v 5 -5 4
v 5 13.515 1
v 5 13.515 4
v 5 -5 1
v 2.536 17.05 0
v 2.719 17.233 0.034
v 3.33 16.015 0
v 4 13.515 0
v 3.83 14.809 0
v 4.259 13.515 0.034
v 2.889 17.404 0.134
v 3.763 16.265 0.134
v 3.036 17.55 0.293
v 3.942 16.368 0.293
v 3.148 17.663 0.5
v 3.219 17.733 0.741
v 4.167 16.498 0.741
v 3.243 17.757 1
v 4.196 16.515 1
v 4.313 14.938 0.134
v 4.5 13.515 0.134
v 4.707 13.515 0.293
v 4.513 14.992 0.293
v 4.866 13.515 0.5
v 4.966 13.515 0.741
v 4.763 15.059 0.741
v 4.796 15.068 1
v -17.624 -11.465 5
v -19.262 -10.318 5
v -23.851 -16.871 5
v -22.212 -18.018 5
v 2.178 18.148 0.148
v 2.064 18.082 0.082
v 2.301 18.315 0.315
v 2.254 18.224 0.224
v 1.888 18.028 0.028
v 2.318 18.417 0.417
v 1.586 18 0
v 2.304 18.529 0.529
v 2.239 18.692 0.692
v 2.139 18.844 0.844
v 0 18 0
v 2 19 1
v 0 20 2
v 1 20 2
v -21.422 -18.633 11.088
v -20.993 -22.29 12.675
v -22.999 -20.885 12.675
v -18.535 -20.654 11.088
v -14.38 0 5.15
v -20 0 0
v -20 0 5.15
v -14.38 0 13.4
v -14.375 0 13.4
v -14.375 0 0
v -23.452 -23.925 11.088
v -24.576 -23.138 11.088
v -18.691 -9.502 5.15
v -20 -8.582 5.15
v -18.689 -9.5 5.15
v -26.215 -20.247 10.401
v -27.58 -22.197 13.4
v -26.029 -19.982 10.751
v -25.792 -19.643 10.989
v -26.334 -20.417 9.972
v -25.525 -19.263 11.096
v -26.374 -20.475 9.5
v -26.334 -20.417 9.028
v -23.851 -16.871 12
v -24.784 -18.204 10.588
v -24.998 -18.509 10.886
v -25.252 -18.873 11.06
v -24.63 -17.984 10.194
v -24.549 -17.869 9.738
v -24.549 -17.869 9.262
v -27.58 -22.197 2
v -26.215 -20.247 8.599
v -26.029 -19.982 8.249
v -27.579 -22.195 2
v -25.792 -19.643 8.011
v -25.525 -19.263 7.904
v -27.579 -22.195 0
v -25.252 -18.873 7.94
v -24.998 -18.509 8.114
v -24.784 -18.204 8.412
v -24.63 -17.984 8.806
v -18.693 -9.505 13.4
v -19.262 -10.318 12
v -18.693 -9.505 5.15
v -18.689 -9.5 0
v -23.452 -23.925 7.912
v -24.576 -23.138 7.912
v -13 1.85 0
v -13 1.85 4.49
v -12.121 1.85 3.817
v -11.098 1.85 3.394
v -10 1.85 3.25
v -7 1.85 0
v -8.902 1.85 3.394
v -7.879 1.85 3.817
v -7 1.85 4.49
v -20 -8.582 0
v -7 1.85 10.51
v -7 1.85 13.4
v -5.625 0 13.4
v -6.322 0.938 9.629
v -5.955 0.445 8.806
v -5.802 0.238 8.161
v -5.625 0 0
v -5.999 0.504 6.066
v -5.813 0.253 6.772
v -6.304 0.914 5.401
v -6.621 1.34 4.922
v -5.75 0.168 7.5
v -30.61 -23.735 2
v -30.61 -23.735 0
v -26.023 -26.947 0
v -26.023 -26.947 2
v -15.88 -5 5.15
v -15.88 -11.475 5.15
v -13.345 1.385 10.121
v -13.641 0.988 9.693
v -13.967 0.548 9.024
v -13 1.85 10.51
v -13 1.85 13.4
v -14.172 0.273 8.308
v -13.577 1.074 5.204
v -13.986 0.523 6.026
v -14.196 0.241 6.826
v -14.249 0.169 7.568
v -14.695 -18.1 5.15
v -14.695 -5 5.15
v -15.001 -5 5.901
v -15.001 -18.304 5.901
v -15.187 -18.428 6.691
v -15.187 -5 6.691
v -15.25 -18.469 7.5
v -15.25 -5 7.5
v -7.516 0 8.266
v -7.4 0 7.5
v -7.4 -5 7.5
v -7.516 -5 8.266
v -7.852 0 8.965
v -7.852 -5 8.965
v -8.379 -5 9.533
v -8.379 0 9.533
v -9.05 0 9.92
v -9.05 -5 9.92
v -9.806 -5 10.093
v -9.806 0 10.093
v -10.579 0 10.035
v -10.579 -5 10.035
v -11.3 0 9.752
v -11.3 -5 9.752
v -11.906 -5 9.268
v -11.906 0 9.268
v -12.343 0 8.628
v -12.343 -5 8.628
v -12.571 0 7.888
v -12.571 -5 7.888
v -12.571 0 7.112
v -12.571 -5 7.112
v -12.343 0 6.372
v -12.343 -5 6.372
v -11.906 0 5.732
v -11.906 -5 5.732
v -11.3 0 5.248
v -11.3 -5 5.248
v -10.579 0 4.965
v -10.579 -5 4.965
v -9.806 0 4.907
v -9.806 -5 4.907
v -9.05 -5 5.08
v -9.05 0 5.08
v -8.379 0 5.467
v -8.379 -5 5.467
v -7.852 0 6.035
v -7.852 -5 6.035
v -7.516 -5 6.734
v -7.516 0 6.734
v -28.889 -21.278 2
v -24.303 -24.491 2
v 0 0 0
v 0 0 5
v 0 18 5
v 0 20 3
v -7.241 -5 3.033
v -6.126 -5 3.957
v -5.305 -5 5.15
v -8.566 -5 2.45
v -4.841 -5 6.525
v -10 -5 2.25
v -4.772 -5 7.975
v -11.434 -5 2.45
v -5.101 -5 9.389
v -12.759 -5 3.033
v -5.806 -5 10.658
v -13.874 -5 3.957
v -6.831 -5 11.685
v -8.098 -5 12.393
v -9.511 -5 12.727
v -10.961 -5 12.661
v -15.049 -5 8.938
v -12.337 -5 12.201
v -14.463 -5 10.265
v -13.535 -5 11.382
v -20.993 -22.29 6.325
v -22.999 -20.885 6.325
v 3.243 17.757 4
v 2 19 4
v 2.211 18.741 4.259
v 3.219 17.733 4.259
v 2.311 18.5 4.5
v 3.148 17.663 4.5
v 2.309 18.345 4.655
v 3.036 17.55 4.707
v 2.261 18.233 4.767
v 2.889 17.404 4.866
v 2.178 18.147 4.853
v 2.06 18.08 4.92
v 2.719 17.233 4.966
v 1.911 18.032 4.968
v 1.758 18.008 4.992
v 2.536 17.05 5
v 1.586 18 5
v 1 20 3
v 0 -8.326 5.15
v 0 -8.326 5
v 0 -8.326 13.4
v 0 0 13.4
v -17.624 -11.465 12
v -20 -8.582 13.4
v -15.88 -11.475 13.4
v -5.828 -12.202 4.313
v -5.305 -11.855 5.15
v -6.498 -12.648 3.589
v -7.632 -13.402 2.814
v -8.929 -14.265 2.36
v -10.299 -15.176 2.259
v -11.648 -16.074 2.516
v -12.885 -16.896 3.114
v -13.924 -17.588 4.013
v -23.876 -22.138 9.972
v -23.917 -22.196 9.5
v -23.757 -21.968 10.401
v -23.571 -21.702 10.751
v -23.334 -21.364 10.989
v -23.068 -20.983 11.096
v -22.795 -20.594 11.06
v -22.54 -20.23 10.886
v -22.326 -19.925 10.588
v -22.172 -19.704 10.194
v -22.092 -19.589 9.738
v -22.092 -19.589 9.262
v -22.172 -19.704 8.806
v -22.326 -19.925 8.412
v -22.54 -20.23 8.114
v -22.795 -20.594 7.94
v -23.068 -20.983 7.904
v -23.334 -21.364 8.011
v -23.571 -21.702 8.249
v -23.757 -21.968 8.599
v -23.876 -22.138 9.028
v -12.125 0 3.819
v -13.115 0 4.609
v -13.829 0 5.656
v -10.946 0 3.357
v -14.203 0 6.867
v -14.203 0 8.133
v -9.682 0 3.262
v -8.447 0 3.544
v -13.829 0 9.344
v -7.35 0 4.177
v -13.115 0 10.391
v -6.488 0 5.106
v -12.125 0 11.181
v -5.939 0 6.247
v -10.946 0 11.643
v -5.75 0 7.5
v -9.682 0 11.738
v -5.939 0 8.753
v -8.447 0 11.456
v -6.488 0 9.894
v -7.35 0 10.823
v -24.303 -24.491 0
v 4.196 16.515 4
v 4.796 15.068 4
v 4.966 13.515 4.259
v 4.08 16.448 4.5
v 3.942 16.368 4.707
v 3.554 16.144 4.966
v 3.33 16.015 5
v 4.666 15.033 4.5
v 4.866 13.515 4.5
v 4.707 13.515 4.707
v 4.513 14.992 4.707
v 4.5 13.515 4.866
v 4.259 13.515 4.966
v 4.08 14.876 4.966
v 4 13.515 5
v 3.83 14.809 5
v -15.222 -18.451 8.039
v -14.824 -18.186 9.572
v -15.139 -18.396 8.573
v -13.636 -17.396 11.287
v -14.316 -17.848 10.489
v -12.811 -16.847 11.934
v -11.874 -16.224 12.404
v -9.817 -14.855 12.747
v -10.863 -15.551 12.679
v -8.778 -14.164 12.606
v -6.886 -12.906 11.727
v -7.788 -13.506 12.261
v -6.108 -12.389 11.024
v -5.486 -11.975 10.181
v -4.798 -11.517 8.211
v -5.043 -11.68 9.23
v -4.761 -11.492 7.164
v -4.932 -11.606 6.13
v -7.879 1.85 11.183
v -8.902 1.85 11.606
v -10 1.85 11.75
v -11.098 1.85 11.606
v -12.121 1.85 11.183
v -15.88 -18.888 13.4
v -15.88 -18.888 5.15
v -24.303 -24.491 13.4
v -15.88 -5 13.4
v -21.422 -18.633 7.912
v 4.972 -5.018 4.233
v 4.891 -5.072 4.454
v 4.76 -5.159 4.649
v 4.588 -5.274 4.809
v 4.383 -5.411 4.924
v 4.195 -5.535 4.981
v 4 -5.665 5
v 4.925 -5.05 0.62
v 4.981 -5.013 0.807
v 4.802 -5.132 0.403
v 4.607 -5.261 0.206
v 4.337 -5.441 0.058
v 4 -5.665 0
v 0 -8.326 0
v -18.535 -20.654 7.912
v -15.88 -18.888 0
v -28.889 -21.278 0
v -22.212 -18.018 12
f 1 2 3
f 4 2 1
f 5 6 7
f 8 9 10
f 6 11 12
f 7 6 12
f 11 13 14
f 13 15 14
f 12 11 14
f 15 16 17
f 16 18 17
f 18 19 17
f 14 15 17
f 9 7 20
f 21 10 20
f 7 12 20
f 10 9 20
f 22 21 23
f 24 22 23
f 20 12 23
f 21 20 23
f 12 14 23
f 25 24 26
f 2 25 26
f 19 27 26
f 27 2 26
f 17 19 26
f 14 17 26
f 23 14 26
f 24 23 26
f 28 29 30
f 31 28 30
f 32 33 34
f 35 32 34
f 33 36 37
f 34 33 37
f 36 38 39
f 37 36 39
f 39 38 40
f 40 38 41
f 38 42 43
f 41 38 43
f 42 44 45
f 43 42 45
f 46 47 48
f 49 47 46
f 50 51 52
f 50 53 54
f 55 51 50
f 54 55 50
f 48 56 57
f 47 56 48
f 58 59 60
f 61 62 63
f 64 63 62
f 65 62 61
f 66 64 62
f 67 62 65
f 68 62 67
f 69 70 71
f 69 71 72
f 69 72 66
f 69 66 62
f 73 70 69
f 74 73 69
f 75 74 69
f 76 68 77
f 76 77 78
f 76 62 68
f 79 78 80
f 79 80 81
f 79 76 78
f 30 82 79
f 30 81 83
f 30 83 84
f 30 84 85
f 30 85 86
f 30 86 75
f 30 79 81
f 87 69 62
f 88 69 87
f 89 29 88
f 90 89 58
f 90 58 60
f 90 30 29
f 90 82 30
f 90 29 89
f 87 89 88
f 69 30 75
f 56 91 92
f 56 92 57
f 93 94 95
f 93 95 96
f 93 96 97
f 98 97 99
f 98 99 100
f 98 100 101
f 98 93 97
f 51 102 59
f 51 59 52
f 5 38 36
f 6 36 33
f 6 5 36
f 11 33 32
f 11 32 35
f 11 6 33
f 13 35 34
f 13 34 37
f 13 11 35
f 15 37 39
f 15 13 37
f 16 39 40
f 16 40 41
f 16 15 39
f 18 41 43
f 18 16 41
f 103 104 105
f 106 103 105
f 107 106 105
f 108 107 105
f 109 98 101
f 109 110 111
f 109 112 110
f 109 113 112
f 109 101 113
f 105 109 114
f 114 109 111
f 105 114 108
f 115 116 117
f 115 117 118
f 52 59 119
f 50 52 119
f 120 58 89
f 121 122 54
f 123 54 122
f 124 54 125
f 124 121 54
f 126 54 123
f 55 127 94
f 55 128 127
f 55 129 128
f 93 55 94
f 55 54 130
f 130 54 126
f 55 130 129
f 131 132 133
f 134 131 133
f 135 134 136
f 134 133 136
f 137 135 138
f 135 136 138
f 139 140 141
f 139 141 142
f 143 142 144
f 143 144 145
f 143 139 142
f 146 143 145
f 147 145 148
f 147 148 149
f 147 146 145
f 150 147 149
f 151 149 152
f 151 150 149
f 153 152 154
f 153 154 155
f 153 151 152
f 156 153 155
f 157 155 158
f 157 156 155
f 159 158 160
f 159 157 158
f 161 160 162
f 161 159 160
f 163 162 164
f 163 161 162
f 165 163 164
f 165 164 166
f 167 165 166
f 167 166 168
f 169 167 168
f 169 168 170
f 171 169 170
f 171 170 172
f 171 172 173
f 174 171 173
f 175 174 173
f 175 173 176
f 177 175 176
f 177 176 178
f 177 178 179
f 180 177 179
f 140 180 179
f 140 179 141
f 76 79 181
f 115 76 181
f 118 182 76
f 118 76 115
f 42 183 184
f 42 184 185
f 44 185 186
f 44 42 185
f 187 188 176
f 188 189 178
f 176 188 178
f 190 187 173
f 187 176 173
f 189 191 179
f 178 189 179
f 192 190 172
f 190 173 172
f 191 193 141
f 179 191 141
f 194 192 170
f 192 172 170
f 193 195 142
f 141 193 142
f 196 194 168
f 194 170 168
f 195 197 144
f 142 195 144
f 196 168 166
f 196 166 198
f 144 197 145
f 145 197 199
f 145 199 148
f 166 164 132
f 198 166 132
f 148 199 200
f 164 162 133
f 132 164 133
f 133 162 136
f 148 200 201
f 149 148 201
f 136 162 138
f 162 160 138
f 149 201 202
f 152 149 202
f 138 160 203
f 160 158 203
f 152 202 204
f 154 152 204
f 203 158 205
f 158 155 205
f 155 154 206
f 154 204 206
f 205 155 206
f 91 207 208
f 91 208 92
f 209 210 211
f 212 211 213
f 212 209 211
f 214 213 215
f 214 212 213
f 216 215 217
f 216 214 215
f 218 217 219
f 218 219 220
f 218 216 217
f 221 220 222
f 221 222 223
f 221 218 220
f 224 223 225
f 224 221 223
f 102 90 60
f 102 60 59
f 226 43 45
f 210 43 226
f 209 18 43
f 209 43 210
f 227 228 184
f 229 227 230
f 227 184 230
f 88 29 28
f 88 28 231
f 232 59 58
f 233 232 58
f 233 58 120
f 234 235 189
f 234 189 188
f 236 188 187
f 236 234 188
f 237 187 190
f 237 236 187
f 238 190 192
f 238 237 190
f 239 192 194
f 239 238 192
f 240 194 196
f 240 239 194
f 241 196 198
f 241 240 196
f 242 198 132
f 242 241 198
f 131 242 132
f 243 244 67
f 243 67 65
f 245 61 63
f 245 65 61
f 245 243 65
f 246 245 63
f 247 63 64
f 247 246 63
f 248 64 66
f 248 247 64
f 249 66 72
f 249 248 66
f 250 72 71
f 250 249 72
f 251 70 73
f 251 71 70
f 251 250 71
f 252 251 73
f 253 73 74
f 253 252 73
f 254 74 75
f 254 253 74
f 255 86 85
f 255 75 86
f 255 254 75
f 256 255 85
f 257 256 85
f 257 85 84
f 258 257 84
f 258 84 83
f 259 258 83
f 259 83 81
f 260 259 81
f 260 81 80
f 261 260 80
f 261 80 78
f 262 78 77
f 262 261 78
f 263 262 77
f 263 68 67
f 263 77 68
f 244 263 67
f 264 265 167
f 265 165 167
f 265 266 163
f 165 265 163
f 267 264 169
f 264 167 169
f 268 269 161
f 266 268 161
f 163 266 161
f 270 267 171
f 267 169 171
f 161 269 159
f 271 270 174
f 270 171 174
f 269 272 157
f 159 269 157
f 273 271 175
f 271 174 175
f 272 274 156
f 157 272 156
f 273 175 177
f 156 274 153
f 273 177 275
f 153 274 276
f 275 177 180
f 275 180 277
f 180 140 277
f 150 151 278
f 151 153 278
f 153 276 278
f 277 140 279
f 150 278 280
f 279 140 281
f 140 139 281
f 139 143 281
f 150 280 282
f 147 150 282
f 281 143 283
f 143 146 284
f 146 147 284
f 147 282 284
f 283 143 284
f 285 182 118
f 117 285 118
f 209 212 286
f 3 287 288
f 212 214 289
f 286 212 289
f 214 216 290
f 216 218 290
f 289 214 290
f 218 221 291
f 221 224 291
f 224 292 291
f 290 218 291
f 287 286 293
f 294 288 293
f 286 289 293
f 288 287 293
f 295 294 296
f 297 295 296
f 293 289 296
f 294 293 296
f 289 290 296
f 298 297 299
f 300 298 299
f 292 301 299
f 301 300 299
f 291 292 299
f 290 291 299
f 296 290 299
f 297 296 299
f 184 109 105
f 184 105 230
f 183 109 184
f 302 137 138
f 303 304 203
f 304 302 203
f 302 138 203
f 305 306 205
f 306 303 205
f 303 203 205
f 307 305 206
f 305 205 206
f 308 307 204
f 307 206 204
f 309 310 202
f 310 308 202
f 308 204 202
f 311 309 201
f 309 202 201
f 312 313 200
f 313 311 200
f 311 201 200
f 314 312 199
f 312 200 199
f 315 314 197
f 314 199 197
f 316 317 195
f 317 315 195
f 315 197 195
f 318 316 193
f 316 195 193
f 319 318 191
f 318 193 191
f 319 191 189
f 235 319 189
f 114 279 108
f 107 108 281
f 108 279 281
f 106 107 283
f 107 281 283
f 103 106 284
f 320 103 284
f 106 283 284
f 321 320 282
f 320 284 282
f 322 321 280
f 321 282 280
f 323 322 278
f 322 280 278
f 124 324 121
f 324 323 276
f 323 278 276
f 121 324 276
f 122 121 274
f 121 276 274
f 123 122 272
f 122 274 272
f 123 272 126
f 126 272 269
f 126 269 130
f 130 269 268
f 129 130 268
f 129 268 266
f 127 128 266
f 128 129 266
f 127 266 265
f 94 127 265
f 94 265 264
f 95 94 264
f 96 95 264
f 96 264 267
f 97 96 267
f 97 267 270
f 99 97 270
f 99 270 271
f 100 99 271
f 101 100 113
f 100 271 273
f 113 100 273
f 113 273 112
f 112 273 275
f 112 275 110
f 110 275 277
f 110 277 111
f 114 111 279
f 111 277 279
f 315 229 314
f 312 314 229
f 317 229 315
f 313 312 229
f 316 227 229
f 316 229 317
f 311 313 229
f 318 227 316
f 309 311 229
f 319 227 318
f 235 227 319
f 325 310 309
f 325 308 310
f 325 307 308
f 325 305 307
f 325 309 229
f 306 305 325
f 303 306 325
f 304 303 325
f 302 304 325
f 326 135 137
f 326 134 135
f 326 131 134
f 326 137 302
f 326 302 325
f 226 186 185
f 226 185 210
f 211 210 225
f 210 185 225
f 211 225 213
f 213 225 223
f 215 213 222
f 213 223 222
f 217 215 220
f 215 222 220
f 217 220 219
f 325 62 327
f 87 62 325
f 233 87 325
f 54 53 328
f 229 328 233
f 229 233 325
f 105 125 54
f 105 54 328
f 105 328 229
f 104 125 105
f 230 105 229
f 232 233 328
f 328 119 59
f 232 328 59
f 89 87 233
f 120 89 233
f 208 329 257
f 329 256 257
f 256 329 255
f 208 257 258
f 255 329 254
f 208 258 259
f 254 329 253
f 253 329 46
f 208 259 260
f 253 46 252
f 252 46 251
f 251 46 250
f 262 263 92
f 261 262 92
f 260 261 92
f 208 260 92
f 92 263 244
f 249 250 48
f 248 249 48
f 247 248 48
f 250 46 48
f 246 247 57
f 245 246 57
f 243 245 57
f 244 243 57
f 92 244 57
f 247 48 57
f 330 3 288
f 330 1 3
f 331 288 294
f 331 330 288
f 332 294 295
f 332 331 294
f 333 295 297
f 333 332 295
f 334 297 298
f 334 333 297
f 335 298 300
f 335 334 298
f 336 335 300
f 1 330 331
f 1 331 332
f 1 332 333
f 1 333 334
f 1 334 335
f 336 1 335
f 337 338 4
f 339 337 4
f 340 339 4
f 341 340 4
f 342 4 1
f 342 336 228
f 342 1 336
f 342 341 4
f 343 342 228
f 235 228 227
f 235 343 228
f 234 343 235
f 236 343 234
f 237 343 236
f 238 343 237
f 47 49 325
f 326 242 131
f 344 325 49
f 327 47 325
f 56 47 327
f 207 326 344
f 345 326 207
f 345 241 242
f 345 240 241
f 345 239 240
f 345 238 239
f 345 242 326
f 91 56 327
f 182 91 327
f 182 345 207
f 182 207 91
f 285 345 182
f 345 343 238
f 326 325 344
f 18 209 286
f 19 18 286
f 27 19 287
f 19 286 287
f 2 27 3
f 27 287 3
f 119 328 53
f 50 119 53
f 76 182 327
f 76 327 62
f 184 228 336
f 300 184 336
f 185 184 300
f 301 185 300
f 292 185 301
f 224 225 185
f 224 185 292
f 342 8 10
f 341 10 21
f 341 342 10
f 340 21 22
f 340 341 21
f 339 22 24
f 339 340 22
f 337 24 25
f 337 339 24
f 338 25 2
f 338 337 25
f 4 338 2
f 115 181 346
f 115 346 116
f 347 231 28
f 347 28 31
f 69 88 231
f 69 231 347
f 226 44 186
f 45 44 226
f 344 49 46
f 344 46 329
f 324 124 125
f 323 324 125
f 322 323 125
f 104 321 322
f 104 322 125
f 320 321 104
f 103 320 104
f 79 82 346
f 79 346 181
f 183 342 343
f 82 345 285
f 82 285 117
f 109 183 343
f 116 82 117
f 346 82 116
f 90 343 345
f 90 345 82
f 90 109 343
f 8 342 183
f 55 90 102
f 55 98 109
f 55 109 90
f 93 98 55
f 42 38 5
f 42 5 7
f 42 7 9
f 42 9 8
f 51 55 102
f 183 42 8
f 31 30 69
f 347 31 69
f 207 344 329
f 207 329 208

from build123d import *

# Parameters (mm, degrees)
PAD_DEPTH            = 13.4
POCKET001_DEPTH      = 8.4
POCKET001_DEPTH_BACK = 100
SKETCH003_R          = 2.6
POCKET002_DEPTH      = 24.4921624319
SKETCH004_R          = 5.25
POCKET_DEPTH         = 25
SKETCH007_W          = 3
SKETCH007_H          = 2
PAD001_DEPTH         = 1.6
PAD001_DEPTH_BACK    = 4
POCKET005_DEPTH      = 8.25
PAD002_DEPTH         = 13.4
POCKET006_DEPTH      = 5
SKETCH010_R          = 4.25
POCKET007_DEPTH      = 5
CHAMFER_SIZE         = 4
CHAMFER001_SIZE      = 2
FILLET_R             = 6
SKETCH011_R          = 1.6
POCKET008_DEPTH      = 16
POCKET009_DEPTH      = 6
SKETCH013_W          = 8
SKETCH013_H          = 7
POCKET010_DEPTH      = 2
FILLET001_R          = 1
PAD003_DEPTH         = 14
PAD004_DEPTH         = 8.25
POCKET011_DEPTH      = 15


with BuildPart() as part:
    # Sketch → Pad (new body)
    with BuildSketch(Plane.XY):
        Polygon((0, 0), (0, 20), (5, 20), (5, -5), (-24.3031833154, -24.4911624319), (-27.5797914926, -22.1968566865), (-18.6893567291, -9.5), (-20, -8.5822777018), (-20, 0), align=None)
    extrude(amount=PAD_DEPTH)

    # Sketch002 → Pocket001 (cut, two sides)
    with BuildSketch(Plane.XY.offset(13.4)) as pocket001_sk:
        Polygon((14.314081, -22.145182), (14.314081, 26.828188), (0, 26.828188), (0, 0), (0, -22.145182), align=None)
    extrude(amount=-POCKET001_DEPTH, mode=Mode.SUBTRACT)
    extrude(pocket001_sk.sketch, amount=POCKET001_DEPTH_BACK, mode=Mode.SUBTRACT)

    # Sketch003 → Pocket002 (cut, through all)
    with BuildSketch(Plane.XZ):
        with Locations((-10, 7.5)):
            Circle(SKETCH003_R)
    extrude(amount=POCKET002_DEPTH, mode=Mode.SUBTRACT)

    # Sketch004 (on DatumPlane) → Pocket (cut)
    with BuildSketch(Plane(origin=(0, -30, 0), x_dir=(-1, 0, 0), z_dir=(0, 1, 0))):
        with Locations((10, 7.5)):
            Circle(SKETCH004_R)
    extrude(amount=POCKET_DEPTH, mode=Mode.SUBTRACT)

    # Sketch007 (on DatumPlane) → Pad001 (join, two sides)
    with BuildSketch(Plane(origin=(-8.0772066494, 5.6557209836, 0), x_dir=(-0.5735764364, -0.8191520443, 0), z_dir=(-0.8191520443, 0.5735764364, 0))) as pad001_sk:
        with Locations((35.5, 1)):
            Rectangle(SKETCH007_W, SKETCH007_H)
    extrude(amount=PAD001_DEPTH)
    extrude(pad001_sk.sketch, amount=-PAD001_DEPTH_BACK)

    # Sketch008 (on DatumPlane) → Pocket005 (cut)
    with BuildSketch(Plane.XY.offset(13.4)):
        Polygon((-15.88, -5), (-14.38, 0), (-20, 0), (-20, -8.59), (-15.88, -11.4748550574), (-15.88, -25), (-3.690549763, -25), (0, -25), (0, -10), (0, -5), align=None)
    extrude(amount=-POCKET005_DEPTH, mode=Mode.SUBTRACT)

    # Sketch009 → Pad002 (join)
    with BuildSketch(Plane.XY):
        Polygon((-14.375, 0), (-13, 1.85), (-7, 1.85), (-5.625, 0), align=None)
    extrude(amount=PAD002_DEPTH)

    # Sketch003 → Pocket006 (cut)
    with BuildSketch(Plane.XZ):
        with Locations((-10, 7.5)):
            Circle(SKETCH003_R)
    extrude(amount=-POCKET006_DEPTH, mode=Mode.SUBTRACT)

    # Sketch010 → Pocket007 (cut)
    with BuildSketch(Plane.XZ):
        with Locations((-10, 7.5)):
            Circle(SKETCH010_R)
    extrude(amount=-POCKET007_DEPTH, mode=Mode.SUBTRACT)

    # Chamfer
    chamfer_edges = [part.edges().sort_by_distance(p)[0] for p in [
        (5, 20, 2.5),
    ]]
    chamfer(chamfer_edges, length=CHAMFER_SIZE)

    # Chamfer001
    chamfer001_edges = [part.edges().sort_by_distance(p)[0] for p in [
        (0.5, 20, 5),
        (0.5, 20, 0),
    ]]
    chamfer(chamfer001_edges, length=CHAMFER001_SIZE)

    # Fillet
    fillet_edges = [part.edges().sort_by_distance(p)[0] for p in [
        (5, 16, 2.5),
    ]]
    fillet(fillet_edges, radius=FILLET_R)

    # Sketch011 (on DatumPlane) → Pocket008 (cut)
    with BuildSketch(Plane(origin=(-0.7048382508, 0.4935330564, 0), x_dir=(-0.5735764364, -0.8191520443, 0), z_dir=(-0.8191520443, 0.5735764364, 0))):
        with Locations((30.3, 9.5)):
            Circle(SKETCH011_R)
    extrude(amount=POCKET008_DEPTH, mode=Mode.SUBTRACT)

    # Sketch012 (on DatumPlane) → Pocket009 (cut)
    with BuildSketch(Plane(origin=(-0.7048382508, 0.4935330564, 0), x_dir=(-0.5735764364, -0.8191520443, 0), z_dir=(-0.8191520443, 0.5735764364, 0))):
        Polygon((33.05, 7.9122867597), (33.05, 11.0877132403), (30.3, 12.6754264805), (27.55, 11.0877132403), (27.55, 7.9122867597), (30.3, 6.3245735195), align=None)
    extrude(amount=POCKET009_DEPTH, mode=Mode.SUBTRACT)

    # Sketch013 (on DatumPlane) → Pocket010 (cut)
    with BuildSketch(Plane(origin=(-8.0772066494, 5.6557209836, 0), x_dir=(-0.5735764364, -0.8191520443, 0), z_dir=(-0.8191520443, 0.5735764364, 0))):
        with Locations((23.5, 8.5)):
            Rectangle(SKETCH013_W, SKETCH013_H)
    extrude(amount=-POCKET010_DEPTH, mode=Mode.SUBTRACT)

    # Fillet001
    fillet001_edges = [part.edges().sort_by_distance(p)[0] for p in [
        (4.543277, 15.810819, 5),
        (4.543277, 15.810819, 0),
    ]]
    fillet(fillet001_edges, radius=FILLET001_R)

    # Fillet001 Face52 → Pad003 (add)
    with BuildSketch(Plane(origin=(-5.7758983743, -5, 10.0600347273), x_dir=(-1, 0, 0), z_dir=(0, -1, 0))):
        with BuildLine():
            Line((-5.7758983743, -3.3399652727), (10.1041016257, -3.3399652727))
            Line((10.1041016257, -3.3399652727), (10.1041016257, 4.9100347273))
            Line((10.1041016257, 4.9100347273), (8.9187794634, 4.9100347273))
            ThreePointArc((8.9187794634, 4.9100347273), (9.3333852666, 3.7673957652), (9.4741016257, 2.5600347273))
            ThreePointArc((9.4741016257, 2.5600347273), (3.0167405877, -2.5492489137), (-0.4705762121, 4.9100347273))
            Line((-0.4705762121, 4.9100347273), (-5.7758983743, 4.9100347273))
            Line((-5.7758983743, 4.9100347273), (-5.7758983743, -3.3399652727))
        make_face()
    extrude(amount=PAD003_DEPTH)

    # Sketch014 (on Face41 of Pad003) → Pad004 (join)
    with BuildSketch(Plane.XY.offset(5.15)):
        Polygon((-15.88, -5), (-20, -8.5822777018), (-15.88, -11.4748550574), align=None)
    extrude(amount=PAD004_DEPTH)

    # Sketch015 → Pocket011 (cut)
    with BuildSketch(Plane.XY):
        Polygon((-15.88, -18.8884389179), (-17.149737, -23.146951), (5.036606, -23.146951), (0, -8.325775603), align=None)
    extrude(amount=POCKET011_DEPTH, mode=Mode.SUBTRACT)


solid = part.part
